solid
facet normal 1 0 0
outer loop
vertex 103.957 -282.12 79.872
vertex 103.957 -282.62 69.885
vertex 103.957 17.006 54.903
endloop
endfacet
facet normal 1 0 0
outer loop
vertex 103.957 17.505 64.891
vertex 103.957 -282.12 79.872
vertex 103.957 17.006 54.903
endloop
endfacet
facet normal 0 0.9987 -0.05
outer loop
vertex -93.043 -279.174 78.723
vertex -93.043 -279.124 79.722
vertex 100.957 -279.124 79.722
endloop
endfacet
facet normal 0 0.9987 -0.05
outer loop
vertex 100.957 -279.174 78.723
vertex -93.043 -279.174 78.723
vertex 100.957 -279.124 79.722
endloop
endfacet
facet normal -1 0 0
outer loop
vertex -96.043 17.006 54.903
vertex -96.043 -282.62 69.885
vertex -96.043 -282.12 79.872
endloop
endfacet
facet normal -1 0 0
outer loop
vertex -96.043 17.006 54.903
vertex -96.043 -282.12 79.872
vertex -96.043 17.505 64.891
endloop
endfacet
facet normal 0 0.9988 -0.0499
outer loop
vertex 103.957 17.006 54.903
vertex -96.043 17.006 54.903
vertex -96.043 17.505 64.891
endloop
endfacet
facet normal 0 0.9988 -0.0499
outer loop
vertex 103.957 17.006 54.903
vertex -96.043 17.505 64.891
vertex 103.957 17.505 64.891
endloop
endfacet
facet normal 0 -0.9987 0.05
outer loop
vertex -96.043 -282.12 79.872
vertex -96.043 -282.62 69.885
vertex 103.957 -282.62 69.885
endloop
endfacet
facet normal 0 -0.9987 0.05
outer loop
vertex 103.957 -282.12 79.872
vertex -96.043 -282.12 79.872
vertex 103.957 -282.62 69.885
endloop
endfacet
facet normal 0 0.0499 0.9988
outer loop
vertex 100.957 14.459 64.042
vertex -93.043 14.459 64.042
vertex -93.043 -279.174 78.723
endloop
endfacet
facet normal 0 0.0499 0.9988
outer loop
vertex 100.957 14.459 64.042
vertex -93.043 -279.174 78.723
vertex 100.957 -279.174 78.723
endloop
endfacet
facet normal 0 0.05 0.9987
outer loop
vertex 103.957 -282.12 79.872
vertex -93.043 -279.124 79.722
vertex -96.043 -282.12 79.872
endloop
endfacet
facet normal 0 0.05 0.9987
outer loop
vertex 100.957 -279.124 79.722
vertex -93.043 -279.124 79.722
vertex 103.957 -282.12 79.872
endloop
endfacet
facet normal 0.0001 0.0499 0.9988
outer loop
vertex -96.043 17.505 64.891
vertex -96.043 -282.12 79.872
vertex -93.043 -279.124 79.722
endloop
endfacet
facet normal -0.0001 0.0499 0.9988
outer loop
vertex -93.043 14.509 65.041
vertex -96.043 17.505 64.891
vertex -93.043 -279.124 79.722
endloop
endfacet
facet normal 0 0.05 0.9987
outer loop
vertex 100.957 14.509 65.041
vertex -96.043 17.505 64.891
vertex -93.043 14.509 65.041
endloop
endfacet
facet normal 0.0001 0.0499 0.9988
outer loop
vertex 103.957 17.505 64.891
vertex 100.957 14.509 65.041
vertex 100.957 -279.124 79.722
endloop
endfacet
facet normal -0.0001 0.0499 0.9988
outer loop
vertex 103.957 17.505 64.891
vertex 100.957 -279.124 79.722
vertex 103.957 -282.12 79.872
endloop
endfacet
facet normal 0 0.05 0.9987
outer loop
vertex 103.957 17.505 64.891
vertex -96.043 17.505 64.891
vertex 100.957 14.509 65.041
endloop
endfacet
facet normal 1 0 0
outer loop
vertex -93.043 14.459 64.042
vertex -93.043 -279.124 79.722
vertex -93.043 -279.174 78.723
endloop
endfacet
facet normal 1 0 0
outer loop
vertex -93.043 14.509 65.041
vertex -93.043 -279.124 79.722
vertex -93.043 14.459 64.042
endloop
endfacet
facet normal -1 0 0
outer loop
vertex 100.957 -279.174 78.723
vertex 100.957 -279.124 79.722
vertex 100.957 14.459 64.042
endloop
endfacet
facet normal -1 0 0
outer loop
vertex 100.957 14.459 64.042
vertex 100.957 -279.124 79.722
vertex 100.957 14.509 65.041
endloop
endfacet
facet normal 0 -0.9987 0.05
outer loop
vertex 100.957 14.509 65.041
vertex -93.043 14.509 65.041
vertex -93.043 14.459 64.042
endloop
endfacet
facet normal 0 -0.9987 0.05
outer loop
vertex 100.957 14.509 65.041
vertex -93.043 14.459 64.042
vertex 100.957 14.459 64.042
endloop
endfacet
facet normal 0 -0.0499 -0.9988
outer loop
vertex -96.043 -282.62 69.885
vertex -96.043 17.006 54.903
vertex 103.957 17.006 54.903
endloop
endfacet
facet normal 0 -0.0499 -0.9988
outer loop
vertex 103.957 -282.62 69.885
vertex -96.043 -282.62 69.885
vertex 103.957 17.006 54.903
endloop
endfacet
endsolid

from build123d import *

# Parameters (mm, degrees)
BOSS_EXTRUDE1_DEPTH      = 5
BOSS_EXTRUDE1_DEPTH_BACK = 5
SKETCH2_W                = 200
SKETCH2_H                = 300
SKETCH4_W                = 194
SKETCH4_H                = 294
CUT_EXTRUDE1_DEPTH       = 1


with BuildPart() as part:
    # Sketch2 → Boss-Extrude1 (new, two sides: drawn at the far end of the back side and taken through both)
    with BuildSketch(Plane(origin=(0, 3.030412593, 60.608251865), x_dir=(1, 0, 0), z_dir=(0, 0.0499376169438969, 0.9987523388778444)).offset(-BOSS_EXTRUDE1_DEPTH_BACK)):
        with Locations((3.957252563, -135.75687777)):
            Rectangle(SKETCH2_W, SKETCH2_H)
    extrude(amount=BOSS_EXTRUDE1_DEPTH + BOSS_EXTRUDE1_DEPTH_BACK)

    # Sketch4 → Cut-Extrude1 (cut)
    with BuildSketch(Plane(origin=(0, 3.280100678, 65.60201356), x_dir=(1, 0, 0), z_dir=(0, 0.049937616943896895, 0.9987523388778444))):
        with Locations((3.957252563, -135.75687777)):
            Rectangle(SKETCH4_W, SKETCH4_H)
    extrude(amount=-CUT_EXTRUDE1_DEPTH, mode=Mode.SUBTRACT)


solid = part.part
